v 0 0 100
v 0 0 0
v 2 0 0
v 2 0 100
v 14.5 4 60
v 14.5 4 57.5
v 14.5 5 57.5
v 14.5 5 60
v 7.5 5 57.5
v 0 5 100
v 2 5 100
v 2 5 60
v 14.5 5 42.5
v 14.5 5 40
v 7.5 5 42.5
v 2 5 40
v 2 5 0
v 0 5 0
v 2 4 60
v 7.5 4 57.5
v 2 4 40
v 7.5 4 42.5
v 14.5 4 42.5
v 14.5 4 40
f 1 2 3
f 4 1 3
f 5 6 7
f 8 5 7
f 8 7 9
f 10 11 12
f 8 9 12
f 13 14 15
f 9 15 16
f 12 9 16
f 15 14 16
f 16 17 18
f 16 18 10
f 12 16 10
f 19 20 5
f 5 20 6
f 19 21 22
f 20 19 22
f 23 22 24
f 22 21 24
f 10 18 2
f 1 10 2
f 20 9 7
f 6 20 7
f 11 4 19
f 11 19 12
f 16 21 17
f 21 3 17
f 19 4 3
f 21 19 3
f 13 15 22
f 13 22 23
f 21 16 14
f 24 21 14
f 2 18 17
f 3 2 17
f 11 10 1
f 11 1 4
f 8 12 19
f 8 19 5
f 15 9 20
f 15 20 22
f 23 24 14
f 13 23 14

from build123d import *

# Parameters (mm, degrees)
SALIENTE_EXTRUIR1_DEPTH = 100
CROQUIS2_W              = 7
CROQUIS2_H              = 15
CROQUIS2_W_2            = 12.5
CROQUIS2_H_2            = 40
CORTAR_EXTRUIR1_DEPTH   = 11


with BuildPart() as part:
    # Croquis1 → Saliente-Extruir1 (new body)
    with BuildSketch(Plane.XY):
        Polygon((0, 0), (2, 0), (2, 4), (14.5, 4), (14.5, 5), (2, 5), (0, 5), align=None)
    extrude(amount=SALIENTE_EXTRUIR1_DEPTH)

    # Croquis2 → Cortar-Extruir1 (cut)
    with BuildSketch(Plane(origin=(0, 5, 0), x_dir=(1, 0, 0), z_dir=(0, 1, 0))):
        with Locations((11, -50)):
            Rectangle(CROQUIS2_W, CROQUIS2_H)
        with Locations((8.25, -20)):
            Rectangle(CROQUIS2_W_2, CROQUIS2_H_2)
        with Locations((8.25, -80)):
            Rectangle(CROQUIS2_W_2, CROQUIS2_H_2)
    extrude(amount=-CORTAR_EXTRUIR1_DEPTH, mode=Mode.SUBTRACT)


solid = part.part
